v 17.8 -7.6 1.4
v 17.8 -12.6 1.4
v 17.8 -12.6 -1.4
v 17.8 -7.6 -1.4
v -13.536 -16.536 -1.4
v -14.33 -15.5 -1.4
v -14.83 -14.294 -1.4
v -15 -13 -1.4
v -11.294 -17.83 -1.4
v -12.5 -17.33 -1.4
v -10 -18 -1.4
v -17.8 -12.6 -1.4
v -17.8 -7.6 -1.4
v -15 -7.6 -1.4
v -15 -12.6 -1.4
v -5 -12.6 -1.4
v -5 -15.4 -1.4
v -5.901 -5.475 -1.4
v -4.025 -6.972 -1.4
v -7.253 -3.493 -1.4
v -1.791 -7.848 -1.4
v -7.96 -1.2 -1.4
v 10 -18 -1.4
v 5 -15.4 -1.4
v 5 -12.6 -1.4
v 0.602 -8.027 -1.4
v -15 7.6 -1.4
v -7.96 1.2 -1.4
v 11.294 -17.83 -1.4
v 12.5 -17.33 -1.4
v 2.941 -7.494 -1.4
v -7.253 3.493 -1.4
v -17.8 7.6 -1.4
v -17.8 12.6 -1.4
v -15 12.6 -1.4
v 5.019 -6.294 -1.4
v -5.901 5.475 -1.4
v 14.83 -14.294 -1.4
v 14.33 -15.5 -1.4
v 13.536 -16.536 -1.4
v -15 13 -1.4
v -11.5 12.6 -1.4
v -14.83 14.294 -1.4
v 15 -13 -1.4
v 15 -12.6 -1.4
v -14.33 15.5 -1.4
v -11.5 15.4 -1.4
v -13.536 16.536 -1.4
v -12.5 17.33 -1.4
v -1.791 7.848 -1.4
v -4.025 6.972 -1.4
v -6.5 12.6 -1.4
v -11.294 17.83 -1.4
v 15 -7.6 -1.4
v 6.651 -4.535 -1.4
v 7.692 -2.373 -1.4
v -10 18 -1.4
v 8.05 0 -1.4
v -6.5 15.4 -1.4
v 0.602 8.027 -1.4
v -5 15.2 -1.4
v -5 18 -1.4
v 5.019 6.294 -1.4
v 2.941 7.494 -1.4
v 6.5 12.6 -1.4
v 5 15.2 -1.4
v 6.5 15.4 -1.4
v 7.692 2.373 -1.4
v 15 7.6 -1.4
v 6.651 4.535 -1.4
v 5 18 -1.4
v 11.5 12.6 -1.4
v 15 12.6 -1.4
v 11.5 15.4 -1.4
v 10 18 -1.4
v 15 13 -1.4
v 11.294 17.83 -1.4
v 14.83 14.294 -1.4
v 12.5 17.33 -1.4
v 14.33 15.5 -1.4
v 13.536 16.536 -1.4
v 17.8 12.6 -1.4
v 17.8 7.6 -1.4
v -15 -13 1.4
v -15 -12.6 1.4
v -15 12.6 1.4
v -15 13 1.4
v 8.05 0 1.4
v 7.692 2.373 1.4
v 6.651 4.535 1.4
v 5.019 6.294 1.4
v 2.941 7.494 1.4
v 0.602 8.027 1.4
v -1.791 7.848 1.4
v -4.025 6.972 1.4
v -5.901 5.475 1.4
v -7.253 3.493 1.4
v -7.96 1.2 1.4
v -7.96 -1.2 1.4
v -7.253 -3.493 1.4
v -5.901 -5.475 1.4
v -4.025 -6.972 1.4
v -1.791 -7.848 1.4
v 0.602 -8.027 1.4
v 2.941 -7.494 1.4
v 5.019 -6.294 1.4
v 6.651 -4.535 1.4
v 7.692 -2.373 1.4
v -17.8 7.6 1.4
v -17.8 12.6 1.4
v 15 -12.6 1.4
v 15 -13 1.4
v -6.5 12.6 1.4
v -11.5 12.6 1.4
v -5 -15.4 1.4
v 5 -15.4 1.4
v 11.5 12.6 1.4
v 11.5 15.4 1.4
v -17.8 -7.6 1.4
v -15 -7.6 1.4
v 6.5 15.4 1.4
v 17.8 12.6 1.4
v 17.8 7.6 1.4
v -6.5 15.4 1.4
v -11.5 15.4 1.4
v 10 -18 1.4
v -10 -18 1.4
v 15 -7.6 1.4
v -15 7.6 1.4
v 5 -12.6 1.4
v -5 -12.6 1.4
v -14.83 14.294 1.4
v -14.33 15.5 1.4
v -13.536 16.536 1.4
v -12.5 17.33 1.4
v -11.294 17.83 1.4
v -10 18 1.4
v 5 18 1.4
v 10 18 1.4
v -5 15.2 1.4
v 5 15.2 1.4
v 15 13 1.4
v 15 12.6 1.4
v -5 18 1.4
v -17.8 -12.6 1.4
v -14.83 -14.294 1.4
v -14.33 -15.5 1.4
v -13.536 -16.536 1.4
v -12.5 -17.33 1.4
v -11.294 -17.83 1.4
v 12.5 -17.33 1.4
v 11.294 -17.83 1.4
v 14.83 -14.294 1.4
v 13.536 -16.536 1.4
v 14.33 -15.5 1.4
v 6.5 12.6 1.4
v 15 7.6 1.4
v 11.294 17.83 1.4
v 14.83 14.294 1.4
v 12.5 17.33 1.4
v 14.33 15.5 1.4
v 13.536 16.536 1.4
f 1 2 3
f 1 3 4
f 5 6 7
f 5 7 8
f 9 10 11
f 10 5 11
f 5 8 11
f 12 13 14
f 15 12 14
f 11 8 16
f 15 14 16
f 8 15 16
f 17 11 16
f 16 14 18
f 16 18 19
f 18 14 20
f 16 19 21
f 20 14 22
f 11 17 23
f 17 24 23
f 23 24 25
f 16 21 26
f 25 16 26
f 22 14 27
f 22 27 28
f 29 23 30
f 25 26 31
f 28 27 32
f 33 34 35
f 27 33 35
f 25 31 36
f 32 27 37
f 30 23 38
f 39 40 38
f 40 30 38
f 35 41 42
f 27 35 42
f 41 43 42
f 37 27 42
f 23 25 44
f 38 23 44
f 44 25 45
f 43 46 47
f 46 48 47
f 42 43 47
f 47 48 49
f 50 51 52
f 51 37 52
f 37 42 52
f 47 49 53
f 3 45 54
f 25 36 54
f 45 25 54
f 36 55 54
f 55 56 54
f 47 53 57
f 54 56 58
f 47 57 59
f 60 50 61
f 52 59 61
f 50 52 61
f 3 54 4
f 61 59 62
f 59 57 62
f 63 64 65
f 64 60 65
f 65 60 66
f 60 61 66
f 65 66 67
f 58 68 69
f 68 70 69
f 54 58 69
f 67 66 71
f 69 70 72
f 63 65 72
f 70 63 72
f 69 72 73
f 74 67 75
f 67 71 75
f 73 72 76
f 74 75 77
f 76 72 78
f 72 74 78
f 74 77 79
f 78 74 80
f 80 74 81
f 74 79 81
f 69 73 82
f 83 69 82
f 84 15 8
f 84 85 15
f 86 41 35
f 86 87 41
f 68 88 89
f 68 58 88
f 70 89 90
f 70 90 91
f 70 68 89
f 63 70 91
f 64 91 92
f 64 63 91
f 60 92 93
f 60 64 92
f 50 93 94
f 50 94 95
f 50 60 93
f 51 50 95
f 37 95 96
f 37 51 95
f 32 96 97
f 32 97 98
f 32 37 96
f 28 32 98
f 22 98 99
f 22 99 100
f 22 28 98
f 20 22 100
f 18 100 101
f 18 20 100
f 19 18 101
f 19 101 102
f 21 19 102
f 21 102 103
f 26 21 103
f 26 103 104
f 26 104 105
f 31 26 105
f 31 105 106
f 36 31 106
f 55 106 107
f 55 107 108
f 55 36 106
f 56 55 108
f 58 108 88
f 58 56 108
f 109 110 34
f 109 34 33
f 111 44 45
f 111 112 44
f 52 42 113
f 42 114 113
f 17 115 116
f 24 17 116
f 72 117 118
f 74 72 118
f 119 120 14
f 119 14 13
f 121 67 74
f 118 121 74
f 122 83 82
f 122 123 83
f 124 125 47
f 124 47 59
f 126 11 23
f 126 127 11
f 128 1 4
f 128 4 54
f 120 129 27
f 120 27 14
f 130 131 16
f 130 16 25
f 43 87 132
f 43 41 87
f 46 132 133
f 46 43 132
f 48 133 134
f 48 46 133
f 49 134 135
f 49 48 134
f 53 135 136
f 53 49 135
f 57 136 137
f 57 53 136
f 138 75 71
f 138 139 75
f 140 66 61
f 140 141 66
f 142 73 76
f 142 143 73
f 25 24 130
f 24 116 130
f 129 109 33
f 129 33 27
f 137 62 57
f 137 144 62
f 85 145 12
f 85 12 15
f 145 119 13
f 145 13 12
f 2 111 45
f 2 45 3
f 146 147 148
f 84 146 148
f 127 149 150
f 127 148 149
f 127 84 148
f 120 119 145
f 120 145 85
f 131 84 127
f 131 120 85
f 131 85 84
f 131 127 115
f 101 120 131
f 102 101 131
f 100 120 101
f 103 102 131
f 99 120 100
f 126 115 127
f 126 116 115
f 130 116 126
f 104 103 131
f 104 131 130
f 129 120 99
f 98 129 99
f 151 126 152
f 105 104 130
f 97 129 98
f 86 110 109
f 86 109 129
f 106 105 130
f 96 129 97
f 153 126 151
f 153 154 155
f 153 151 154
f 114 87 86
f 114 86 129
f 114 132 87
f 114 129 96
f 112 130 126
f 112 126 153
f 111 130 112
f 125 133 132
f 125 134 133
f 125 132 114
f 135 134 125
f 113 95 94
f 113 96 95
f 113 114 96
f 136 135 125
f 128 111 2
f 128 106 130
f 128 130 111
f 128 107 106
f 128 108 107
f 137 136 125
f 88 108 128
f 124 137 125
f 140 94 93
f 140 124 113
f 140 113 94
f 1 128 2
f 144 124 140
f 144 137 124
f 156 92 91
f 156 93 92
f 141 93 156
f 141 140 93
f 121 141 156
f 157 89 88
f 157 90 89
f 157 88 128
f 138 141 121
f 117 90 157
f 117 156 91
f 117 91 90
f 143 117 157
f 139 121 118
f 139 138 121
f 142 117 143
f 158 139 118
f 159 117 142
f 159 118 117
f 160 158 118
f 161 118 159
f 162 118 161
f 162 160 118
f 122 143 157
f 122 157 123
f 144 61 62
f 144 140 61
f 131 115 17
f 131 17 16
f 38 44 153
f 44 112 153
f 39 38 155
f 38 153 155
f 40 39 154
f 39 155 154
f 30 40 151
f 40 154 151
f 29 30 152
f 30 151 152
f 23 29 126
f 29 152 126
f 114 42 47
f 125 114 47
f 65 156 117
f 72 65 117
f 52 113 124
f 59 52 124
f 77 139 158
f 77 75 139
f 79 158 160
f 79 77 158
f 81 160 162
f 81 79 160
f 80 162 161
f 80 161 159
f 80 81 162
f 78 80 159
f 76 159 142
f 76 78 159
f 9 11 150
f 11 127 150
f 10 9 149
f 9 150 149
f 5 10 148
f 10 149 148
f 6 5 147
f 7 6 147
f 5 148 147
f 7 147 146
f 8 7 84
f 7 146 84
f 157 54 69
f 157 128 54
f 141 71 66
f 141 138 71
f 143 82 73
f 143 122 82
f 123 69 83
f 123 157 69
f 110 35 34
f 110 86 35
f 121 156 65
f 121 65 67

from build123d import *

# Parameters (mm, degrees)
SKETCH_1_R      = 8.05
SKETCH_1_W      = 10
SKETCH_1_H      = 2.8
SKETCH_1_W_2    = 5
EXTRUDE_1_DEPTH = 1.4
FILLET_1_R      = 5


with BuildPart() as part:
    # Эскиз1 → Бобышка-Вытянуть1 (new, symmetric)
    with BuildSketch(Plane.XY):
        Polygon((-15, 12.6), (-17.8, 12.6), (-17.8, 7.6), (-15, 7.6), (-15, -7.6), (-17.8, -7.6), (-17.8, -12.6), (-15, -12.6), (-15, -18), (15, -18), (15, -12.6), (17.8, -12.6), (17.8, -7.6), (15, -7.6), (15, 7.6), (17.8, 7.6), (17.8, 12.6), (15, 12.6), (15, 18), (5, 18), (5, 15.2), (-5, 15.2), (-5, 18), (-15, 18), align=None)
        Circle(SKETCH_1_R, mode=Mode.SUBTRACT)
        with Locations((0, -14)):
            Rectangle(SKETCH_1_W, SKETCH_1_H, mode=Mode.SUBTRACT)
        with Locations((9, 14)):
            Rectangle(SKETCH_1_W_2, SKETCH_1_H, mode=Mode.SUBTRACT)
        with Locations((-9, 14)):
            Rectangle(SKETCH_1_W_2, SKETCH_1_H, mode=Mode.SUBTRACT)
    extrude(amount=EXTRUDE_1_DEPTH, both=True)

    # Скругление1
    fillet_1_edges = [part.edges().sort_by_distance(p)[0] for p in [
        (15, 18, 0),
        (15, -18, 0),
        (-15, -18, 0),
        (-15, 18, 0),
    ]]
    fillet(fillet_1_edges, radius=FILLET_1_R)


solid = part.part
